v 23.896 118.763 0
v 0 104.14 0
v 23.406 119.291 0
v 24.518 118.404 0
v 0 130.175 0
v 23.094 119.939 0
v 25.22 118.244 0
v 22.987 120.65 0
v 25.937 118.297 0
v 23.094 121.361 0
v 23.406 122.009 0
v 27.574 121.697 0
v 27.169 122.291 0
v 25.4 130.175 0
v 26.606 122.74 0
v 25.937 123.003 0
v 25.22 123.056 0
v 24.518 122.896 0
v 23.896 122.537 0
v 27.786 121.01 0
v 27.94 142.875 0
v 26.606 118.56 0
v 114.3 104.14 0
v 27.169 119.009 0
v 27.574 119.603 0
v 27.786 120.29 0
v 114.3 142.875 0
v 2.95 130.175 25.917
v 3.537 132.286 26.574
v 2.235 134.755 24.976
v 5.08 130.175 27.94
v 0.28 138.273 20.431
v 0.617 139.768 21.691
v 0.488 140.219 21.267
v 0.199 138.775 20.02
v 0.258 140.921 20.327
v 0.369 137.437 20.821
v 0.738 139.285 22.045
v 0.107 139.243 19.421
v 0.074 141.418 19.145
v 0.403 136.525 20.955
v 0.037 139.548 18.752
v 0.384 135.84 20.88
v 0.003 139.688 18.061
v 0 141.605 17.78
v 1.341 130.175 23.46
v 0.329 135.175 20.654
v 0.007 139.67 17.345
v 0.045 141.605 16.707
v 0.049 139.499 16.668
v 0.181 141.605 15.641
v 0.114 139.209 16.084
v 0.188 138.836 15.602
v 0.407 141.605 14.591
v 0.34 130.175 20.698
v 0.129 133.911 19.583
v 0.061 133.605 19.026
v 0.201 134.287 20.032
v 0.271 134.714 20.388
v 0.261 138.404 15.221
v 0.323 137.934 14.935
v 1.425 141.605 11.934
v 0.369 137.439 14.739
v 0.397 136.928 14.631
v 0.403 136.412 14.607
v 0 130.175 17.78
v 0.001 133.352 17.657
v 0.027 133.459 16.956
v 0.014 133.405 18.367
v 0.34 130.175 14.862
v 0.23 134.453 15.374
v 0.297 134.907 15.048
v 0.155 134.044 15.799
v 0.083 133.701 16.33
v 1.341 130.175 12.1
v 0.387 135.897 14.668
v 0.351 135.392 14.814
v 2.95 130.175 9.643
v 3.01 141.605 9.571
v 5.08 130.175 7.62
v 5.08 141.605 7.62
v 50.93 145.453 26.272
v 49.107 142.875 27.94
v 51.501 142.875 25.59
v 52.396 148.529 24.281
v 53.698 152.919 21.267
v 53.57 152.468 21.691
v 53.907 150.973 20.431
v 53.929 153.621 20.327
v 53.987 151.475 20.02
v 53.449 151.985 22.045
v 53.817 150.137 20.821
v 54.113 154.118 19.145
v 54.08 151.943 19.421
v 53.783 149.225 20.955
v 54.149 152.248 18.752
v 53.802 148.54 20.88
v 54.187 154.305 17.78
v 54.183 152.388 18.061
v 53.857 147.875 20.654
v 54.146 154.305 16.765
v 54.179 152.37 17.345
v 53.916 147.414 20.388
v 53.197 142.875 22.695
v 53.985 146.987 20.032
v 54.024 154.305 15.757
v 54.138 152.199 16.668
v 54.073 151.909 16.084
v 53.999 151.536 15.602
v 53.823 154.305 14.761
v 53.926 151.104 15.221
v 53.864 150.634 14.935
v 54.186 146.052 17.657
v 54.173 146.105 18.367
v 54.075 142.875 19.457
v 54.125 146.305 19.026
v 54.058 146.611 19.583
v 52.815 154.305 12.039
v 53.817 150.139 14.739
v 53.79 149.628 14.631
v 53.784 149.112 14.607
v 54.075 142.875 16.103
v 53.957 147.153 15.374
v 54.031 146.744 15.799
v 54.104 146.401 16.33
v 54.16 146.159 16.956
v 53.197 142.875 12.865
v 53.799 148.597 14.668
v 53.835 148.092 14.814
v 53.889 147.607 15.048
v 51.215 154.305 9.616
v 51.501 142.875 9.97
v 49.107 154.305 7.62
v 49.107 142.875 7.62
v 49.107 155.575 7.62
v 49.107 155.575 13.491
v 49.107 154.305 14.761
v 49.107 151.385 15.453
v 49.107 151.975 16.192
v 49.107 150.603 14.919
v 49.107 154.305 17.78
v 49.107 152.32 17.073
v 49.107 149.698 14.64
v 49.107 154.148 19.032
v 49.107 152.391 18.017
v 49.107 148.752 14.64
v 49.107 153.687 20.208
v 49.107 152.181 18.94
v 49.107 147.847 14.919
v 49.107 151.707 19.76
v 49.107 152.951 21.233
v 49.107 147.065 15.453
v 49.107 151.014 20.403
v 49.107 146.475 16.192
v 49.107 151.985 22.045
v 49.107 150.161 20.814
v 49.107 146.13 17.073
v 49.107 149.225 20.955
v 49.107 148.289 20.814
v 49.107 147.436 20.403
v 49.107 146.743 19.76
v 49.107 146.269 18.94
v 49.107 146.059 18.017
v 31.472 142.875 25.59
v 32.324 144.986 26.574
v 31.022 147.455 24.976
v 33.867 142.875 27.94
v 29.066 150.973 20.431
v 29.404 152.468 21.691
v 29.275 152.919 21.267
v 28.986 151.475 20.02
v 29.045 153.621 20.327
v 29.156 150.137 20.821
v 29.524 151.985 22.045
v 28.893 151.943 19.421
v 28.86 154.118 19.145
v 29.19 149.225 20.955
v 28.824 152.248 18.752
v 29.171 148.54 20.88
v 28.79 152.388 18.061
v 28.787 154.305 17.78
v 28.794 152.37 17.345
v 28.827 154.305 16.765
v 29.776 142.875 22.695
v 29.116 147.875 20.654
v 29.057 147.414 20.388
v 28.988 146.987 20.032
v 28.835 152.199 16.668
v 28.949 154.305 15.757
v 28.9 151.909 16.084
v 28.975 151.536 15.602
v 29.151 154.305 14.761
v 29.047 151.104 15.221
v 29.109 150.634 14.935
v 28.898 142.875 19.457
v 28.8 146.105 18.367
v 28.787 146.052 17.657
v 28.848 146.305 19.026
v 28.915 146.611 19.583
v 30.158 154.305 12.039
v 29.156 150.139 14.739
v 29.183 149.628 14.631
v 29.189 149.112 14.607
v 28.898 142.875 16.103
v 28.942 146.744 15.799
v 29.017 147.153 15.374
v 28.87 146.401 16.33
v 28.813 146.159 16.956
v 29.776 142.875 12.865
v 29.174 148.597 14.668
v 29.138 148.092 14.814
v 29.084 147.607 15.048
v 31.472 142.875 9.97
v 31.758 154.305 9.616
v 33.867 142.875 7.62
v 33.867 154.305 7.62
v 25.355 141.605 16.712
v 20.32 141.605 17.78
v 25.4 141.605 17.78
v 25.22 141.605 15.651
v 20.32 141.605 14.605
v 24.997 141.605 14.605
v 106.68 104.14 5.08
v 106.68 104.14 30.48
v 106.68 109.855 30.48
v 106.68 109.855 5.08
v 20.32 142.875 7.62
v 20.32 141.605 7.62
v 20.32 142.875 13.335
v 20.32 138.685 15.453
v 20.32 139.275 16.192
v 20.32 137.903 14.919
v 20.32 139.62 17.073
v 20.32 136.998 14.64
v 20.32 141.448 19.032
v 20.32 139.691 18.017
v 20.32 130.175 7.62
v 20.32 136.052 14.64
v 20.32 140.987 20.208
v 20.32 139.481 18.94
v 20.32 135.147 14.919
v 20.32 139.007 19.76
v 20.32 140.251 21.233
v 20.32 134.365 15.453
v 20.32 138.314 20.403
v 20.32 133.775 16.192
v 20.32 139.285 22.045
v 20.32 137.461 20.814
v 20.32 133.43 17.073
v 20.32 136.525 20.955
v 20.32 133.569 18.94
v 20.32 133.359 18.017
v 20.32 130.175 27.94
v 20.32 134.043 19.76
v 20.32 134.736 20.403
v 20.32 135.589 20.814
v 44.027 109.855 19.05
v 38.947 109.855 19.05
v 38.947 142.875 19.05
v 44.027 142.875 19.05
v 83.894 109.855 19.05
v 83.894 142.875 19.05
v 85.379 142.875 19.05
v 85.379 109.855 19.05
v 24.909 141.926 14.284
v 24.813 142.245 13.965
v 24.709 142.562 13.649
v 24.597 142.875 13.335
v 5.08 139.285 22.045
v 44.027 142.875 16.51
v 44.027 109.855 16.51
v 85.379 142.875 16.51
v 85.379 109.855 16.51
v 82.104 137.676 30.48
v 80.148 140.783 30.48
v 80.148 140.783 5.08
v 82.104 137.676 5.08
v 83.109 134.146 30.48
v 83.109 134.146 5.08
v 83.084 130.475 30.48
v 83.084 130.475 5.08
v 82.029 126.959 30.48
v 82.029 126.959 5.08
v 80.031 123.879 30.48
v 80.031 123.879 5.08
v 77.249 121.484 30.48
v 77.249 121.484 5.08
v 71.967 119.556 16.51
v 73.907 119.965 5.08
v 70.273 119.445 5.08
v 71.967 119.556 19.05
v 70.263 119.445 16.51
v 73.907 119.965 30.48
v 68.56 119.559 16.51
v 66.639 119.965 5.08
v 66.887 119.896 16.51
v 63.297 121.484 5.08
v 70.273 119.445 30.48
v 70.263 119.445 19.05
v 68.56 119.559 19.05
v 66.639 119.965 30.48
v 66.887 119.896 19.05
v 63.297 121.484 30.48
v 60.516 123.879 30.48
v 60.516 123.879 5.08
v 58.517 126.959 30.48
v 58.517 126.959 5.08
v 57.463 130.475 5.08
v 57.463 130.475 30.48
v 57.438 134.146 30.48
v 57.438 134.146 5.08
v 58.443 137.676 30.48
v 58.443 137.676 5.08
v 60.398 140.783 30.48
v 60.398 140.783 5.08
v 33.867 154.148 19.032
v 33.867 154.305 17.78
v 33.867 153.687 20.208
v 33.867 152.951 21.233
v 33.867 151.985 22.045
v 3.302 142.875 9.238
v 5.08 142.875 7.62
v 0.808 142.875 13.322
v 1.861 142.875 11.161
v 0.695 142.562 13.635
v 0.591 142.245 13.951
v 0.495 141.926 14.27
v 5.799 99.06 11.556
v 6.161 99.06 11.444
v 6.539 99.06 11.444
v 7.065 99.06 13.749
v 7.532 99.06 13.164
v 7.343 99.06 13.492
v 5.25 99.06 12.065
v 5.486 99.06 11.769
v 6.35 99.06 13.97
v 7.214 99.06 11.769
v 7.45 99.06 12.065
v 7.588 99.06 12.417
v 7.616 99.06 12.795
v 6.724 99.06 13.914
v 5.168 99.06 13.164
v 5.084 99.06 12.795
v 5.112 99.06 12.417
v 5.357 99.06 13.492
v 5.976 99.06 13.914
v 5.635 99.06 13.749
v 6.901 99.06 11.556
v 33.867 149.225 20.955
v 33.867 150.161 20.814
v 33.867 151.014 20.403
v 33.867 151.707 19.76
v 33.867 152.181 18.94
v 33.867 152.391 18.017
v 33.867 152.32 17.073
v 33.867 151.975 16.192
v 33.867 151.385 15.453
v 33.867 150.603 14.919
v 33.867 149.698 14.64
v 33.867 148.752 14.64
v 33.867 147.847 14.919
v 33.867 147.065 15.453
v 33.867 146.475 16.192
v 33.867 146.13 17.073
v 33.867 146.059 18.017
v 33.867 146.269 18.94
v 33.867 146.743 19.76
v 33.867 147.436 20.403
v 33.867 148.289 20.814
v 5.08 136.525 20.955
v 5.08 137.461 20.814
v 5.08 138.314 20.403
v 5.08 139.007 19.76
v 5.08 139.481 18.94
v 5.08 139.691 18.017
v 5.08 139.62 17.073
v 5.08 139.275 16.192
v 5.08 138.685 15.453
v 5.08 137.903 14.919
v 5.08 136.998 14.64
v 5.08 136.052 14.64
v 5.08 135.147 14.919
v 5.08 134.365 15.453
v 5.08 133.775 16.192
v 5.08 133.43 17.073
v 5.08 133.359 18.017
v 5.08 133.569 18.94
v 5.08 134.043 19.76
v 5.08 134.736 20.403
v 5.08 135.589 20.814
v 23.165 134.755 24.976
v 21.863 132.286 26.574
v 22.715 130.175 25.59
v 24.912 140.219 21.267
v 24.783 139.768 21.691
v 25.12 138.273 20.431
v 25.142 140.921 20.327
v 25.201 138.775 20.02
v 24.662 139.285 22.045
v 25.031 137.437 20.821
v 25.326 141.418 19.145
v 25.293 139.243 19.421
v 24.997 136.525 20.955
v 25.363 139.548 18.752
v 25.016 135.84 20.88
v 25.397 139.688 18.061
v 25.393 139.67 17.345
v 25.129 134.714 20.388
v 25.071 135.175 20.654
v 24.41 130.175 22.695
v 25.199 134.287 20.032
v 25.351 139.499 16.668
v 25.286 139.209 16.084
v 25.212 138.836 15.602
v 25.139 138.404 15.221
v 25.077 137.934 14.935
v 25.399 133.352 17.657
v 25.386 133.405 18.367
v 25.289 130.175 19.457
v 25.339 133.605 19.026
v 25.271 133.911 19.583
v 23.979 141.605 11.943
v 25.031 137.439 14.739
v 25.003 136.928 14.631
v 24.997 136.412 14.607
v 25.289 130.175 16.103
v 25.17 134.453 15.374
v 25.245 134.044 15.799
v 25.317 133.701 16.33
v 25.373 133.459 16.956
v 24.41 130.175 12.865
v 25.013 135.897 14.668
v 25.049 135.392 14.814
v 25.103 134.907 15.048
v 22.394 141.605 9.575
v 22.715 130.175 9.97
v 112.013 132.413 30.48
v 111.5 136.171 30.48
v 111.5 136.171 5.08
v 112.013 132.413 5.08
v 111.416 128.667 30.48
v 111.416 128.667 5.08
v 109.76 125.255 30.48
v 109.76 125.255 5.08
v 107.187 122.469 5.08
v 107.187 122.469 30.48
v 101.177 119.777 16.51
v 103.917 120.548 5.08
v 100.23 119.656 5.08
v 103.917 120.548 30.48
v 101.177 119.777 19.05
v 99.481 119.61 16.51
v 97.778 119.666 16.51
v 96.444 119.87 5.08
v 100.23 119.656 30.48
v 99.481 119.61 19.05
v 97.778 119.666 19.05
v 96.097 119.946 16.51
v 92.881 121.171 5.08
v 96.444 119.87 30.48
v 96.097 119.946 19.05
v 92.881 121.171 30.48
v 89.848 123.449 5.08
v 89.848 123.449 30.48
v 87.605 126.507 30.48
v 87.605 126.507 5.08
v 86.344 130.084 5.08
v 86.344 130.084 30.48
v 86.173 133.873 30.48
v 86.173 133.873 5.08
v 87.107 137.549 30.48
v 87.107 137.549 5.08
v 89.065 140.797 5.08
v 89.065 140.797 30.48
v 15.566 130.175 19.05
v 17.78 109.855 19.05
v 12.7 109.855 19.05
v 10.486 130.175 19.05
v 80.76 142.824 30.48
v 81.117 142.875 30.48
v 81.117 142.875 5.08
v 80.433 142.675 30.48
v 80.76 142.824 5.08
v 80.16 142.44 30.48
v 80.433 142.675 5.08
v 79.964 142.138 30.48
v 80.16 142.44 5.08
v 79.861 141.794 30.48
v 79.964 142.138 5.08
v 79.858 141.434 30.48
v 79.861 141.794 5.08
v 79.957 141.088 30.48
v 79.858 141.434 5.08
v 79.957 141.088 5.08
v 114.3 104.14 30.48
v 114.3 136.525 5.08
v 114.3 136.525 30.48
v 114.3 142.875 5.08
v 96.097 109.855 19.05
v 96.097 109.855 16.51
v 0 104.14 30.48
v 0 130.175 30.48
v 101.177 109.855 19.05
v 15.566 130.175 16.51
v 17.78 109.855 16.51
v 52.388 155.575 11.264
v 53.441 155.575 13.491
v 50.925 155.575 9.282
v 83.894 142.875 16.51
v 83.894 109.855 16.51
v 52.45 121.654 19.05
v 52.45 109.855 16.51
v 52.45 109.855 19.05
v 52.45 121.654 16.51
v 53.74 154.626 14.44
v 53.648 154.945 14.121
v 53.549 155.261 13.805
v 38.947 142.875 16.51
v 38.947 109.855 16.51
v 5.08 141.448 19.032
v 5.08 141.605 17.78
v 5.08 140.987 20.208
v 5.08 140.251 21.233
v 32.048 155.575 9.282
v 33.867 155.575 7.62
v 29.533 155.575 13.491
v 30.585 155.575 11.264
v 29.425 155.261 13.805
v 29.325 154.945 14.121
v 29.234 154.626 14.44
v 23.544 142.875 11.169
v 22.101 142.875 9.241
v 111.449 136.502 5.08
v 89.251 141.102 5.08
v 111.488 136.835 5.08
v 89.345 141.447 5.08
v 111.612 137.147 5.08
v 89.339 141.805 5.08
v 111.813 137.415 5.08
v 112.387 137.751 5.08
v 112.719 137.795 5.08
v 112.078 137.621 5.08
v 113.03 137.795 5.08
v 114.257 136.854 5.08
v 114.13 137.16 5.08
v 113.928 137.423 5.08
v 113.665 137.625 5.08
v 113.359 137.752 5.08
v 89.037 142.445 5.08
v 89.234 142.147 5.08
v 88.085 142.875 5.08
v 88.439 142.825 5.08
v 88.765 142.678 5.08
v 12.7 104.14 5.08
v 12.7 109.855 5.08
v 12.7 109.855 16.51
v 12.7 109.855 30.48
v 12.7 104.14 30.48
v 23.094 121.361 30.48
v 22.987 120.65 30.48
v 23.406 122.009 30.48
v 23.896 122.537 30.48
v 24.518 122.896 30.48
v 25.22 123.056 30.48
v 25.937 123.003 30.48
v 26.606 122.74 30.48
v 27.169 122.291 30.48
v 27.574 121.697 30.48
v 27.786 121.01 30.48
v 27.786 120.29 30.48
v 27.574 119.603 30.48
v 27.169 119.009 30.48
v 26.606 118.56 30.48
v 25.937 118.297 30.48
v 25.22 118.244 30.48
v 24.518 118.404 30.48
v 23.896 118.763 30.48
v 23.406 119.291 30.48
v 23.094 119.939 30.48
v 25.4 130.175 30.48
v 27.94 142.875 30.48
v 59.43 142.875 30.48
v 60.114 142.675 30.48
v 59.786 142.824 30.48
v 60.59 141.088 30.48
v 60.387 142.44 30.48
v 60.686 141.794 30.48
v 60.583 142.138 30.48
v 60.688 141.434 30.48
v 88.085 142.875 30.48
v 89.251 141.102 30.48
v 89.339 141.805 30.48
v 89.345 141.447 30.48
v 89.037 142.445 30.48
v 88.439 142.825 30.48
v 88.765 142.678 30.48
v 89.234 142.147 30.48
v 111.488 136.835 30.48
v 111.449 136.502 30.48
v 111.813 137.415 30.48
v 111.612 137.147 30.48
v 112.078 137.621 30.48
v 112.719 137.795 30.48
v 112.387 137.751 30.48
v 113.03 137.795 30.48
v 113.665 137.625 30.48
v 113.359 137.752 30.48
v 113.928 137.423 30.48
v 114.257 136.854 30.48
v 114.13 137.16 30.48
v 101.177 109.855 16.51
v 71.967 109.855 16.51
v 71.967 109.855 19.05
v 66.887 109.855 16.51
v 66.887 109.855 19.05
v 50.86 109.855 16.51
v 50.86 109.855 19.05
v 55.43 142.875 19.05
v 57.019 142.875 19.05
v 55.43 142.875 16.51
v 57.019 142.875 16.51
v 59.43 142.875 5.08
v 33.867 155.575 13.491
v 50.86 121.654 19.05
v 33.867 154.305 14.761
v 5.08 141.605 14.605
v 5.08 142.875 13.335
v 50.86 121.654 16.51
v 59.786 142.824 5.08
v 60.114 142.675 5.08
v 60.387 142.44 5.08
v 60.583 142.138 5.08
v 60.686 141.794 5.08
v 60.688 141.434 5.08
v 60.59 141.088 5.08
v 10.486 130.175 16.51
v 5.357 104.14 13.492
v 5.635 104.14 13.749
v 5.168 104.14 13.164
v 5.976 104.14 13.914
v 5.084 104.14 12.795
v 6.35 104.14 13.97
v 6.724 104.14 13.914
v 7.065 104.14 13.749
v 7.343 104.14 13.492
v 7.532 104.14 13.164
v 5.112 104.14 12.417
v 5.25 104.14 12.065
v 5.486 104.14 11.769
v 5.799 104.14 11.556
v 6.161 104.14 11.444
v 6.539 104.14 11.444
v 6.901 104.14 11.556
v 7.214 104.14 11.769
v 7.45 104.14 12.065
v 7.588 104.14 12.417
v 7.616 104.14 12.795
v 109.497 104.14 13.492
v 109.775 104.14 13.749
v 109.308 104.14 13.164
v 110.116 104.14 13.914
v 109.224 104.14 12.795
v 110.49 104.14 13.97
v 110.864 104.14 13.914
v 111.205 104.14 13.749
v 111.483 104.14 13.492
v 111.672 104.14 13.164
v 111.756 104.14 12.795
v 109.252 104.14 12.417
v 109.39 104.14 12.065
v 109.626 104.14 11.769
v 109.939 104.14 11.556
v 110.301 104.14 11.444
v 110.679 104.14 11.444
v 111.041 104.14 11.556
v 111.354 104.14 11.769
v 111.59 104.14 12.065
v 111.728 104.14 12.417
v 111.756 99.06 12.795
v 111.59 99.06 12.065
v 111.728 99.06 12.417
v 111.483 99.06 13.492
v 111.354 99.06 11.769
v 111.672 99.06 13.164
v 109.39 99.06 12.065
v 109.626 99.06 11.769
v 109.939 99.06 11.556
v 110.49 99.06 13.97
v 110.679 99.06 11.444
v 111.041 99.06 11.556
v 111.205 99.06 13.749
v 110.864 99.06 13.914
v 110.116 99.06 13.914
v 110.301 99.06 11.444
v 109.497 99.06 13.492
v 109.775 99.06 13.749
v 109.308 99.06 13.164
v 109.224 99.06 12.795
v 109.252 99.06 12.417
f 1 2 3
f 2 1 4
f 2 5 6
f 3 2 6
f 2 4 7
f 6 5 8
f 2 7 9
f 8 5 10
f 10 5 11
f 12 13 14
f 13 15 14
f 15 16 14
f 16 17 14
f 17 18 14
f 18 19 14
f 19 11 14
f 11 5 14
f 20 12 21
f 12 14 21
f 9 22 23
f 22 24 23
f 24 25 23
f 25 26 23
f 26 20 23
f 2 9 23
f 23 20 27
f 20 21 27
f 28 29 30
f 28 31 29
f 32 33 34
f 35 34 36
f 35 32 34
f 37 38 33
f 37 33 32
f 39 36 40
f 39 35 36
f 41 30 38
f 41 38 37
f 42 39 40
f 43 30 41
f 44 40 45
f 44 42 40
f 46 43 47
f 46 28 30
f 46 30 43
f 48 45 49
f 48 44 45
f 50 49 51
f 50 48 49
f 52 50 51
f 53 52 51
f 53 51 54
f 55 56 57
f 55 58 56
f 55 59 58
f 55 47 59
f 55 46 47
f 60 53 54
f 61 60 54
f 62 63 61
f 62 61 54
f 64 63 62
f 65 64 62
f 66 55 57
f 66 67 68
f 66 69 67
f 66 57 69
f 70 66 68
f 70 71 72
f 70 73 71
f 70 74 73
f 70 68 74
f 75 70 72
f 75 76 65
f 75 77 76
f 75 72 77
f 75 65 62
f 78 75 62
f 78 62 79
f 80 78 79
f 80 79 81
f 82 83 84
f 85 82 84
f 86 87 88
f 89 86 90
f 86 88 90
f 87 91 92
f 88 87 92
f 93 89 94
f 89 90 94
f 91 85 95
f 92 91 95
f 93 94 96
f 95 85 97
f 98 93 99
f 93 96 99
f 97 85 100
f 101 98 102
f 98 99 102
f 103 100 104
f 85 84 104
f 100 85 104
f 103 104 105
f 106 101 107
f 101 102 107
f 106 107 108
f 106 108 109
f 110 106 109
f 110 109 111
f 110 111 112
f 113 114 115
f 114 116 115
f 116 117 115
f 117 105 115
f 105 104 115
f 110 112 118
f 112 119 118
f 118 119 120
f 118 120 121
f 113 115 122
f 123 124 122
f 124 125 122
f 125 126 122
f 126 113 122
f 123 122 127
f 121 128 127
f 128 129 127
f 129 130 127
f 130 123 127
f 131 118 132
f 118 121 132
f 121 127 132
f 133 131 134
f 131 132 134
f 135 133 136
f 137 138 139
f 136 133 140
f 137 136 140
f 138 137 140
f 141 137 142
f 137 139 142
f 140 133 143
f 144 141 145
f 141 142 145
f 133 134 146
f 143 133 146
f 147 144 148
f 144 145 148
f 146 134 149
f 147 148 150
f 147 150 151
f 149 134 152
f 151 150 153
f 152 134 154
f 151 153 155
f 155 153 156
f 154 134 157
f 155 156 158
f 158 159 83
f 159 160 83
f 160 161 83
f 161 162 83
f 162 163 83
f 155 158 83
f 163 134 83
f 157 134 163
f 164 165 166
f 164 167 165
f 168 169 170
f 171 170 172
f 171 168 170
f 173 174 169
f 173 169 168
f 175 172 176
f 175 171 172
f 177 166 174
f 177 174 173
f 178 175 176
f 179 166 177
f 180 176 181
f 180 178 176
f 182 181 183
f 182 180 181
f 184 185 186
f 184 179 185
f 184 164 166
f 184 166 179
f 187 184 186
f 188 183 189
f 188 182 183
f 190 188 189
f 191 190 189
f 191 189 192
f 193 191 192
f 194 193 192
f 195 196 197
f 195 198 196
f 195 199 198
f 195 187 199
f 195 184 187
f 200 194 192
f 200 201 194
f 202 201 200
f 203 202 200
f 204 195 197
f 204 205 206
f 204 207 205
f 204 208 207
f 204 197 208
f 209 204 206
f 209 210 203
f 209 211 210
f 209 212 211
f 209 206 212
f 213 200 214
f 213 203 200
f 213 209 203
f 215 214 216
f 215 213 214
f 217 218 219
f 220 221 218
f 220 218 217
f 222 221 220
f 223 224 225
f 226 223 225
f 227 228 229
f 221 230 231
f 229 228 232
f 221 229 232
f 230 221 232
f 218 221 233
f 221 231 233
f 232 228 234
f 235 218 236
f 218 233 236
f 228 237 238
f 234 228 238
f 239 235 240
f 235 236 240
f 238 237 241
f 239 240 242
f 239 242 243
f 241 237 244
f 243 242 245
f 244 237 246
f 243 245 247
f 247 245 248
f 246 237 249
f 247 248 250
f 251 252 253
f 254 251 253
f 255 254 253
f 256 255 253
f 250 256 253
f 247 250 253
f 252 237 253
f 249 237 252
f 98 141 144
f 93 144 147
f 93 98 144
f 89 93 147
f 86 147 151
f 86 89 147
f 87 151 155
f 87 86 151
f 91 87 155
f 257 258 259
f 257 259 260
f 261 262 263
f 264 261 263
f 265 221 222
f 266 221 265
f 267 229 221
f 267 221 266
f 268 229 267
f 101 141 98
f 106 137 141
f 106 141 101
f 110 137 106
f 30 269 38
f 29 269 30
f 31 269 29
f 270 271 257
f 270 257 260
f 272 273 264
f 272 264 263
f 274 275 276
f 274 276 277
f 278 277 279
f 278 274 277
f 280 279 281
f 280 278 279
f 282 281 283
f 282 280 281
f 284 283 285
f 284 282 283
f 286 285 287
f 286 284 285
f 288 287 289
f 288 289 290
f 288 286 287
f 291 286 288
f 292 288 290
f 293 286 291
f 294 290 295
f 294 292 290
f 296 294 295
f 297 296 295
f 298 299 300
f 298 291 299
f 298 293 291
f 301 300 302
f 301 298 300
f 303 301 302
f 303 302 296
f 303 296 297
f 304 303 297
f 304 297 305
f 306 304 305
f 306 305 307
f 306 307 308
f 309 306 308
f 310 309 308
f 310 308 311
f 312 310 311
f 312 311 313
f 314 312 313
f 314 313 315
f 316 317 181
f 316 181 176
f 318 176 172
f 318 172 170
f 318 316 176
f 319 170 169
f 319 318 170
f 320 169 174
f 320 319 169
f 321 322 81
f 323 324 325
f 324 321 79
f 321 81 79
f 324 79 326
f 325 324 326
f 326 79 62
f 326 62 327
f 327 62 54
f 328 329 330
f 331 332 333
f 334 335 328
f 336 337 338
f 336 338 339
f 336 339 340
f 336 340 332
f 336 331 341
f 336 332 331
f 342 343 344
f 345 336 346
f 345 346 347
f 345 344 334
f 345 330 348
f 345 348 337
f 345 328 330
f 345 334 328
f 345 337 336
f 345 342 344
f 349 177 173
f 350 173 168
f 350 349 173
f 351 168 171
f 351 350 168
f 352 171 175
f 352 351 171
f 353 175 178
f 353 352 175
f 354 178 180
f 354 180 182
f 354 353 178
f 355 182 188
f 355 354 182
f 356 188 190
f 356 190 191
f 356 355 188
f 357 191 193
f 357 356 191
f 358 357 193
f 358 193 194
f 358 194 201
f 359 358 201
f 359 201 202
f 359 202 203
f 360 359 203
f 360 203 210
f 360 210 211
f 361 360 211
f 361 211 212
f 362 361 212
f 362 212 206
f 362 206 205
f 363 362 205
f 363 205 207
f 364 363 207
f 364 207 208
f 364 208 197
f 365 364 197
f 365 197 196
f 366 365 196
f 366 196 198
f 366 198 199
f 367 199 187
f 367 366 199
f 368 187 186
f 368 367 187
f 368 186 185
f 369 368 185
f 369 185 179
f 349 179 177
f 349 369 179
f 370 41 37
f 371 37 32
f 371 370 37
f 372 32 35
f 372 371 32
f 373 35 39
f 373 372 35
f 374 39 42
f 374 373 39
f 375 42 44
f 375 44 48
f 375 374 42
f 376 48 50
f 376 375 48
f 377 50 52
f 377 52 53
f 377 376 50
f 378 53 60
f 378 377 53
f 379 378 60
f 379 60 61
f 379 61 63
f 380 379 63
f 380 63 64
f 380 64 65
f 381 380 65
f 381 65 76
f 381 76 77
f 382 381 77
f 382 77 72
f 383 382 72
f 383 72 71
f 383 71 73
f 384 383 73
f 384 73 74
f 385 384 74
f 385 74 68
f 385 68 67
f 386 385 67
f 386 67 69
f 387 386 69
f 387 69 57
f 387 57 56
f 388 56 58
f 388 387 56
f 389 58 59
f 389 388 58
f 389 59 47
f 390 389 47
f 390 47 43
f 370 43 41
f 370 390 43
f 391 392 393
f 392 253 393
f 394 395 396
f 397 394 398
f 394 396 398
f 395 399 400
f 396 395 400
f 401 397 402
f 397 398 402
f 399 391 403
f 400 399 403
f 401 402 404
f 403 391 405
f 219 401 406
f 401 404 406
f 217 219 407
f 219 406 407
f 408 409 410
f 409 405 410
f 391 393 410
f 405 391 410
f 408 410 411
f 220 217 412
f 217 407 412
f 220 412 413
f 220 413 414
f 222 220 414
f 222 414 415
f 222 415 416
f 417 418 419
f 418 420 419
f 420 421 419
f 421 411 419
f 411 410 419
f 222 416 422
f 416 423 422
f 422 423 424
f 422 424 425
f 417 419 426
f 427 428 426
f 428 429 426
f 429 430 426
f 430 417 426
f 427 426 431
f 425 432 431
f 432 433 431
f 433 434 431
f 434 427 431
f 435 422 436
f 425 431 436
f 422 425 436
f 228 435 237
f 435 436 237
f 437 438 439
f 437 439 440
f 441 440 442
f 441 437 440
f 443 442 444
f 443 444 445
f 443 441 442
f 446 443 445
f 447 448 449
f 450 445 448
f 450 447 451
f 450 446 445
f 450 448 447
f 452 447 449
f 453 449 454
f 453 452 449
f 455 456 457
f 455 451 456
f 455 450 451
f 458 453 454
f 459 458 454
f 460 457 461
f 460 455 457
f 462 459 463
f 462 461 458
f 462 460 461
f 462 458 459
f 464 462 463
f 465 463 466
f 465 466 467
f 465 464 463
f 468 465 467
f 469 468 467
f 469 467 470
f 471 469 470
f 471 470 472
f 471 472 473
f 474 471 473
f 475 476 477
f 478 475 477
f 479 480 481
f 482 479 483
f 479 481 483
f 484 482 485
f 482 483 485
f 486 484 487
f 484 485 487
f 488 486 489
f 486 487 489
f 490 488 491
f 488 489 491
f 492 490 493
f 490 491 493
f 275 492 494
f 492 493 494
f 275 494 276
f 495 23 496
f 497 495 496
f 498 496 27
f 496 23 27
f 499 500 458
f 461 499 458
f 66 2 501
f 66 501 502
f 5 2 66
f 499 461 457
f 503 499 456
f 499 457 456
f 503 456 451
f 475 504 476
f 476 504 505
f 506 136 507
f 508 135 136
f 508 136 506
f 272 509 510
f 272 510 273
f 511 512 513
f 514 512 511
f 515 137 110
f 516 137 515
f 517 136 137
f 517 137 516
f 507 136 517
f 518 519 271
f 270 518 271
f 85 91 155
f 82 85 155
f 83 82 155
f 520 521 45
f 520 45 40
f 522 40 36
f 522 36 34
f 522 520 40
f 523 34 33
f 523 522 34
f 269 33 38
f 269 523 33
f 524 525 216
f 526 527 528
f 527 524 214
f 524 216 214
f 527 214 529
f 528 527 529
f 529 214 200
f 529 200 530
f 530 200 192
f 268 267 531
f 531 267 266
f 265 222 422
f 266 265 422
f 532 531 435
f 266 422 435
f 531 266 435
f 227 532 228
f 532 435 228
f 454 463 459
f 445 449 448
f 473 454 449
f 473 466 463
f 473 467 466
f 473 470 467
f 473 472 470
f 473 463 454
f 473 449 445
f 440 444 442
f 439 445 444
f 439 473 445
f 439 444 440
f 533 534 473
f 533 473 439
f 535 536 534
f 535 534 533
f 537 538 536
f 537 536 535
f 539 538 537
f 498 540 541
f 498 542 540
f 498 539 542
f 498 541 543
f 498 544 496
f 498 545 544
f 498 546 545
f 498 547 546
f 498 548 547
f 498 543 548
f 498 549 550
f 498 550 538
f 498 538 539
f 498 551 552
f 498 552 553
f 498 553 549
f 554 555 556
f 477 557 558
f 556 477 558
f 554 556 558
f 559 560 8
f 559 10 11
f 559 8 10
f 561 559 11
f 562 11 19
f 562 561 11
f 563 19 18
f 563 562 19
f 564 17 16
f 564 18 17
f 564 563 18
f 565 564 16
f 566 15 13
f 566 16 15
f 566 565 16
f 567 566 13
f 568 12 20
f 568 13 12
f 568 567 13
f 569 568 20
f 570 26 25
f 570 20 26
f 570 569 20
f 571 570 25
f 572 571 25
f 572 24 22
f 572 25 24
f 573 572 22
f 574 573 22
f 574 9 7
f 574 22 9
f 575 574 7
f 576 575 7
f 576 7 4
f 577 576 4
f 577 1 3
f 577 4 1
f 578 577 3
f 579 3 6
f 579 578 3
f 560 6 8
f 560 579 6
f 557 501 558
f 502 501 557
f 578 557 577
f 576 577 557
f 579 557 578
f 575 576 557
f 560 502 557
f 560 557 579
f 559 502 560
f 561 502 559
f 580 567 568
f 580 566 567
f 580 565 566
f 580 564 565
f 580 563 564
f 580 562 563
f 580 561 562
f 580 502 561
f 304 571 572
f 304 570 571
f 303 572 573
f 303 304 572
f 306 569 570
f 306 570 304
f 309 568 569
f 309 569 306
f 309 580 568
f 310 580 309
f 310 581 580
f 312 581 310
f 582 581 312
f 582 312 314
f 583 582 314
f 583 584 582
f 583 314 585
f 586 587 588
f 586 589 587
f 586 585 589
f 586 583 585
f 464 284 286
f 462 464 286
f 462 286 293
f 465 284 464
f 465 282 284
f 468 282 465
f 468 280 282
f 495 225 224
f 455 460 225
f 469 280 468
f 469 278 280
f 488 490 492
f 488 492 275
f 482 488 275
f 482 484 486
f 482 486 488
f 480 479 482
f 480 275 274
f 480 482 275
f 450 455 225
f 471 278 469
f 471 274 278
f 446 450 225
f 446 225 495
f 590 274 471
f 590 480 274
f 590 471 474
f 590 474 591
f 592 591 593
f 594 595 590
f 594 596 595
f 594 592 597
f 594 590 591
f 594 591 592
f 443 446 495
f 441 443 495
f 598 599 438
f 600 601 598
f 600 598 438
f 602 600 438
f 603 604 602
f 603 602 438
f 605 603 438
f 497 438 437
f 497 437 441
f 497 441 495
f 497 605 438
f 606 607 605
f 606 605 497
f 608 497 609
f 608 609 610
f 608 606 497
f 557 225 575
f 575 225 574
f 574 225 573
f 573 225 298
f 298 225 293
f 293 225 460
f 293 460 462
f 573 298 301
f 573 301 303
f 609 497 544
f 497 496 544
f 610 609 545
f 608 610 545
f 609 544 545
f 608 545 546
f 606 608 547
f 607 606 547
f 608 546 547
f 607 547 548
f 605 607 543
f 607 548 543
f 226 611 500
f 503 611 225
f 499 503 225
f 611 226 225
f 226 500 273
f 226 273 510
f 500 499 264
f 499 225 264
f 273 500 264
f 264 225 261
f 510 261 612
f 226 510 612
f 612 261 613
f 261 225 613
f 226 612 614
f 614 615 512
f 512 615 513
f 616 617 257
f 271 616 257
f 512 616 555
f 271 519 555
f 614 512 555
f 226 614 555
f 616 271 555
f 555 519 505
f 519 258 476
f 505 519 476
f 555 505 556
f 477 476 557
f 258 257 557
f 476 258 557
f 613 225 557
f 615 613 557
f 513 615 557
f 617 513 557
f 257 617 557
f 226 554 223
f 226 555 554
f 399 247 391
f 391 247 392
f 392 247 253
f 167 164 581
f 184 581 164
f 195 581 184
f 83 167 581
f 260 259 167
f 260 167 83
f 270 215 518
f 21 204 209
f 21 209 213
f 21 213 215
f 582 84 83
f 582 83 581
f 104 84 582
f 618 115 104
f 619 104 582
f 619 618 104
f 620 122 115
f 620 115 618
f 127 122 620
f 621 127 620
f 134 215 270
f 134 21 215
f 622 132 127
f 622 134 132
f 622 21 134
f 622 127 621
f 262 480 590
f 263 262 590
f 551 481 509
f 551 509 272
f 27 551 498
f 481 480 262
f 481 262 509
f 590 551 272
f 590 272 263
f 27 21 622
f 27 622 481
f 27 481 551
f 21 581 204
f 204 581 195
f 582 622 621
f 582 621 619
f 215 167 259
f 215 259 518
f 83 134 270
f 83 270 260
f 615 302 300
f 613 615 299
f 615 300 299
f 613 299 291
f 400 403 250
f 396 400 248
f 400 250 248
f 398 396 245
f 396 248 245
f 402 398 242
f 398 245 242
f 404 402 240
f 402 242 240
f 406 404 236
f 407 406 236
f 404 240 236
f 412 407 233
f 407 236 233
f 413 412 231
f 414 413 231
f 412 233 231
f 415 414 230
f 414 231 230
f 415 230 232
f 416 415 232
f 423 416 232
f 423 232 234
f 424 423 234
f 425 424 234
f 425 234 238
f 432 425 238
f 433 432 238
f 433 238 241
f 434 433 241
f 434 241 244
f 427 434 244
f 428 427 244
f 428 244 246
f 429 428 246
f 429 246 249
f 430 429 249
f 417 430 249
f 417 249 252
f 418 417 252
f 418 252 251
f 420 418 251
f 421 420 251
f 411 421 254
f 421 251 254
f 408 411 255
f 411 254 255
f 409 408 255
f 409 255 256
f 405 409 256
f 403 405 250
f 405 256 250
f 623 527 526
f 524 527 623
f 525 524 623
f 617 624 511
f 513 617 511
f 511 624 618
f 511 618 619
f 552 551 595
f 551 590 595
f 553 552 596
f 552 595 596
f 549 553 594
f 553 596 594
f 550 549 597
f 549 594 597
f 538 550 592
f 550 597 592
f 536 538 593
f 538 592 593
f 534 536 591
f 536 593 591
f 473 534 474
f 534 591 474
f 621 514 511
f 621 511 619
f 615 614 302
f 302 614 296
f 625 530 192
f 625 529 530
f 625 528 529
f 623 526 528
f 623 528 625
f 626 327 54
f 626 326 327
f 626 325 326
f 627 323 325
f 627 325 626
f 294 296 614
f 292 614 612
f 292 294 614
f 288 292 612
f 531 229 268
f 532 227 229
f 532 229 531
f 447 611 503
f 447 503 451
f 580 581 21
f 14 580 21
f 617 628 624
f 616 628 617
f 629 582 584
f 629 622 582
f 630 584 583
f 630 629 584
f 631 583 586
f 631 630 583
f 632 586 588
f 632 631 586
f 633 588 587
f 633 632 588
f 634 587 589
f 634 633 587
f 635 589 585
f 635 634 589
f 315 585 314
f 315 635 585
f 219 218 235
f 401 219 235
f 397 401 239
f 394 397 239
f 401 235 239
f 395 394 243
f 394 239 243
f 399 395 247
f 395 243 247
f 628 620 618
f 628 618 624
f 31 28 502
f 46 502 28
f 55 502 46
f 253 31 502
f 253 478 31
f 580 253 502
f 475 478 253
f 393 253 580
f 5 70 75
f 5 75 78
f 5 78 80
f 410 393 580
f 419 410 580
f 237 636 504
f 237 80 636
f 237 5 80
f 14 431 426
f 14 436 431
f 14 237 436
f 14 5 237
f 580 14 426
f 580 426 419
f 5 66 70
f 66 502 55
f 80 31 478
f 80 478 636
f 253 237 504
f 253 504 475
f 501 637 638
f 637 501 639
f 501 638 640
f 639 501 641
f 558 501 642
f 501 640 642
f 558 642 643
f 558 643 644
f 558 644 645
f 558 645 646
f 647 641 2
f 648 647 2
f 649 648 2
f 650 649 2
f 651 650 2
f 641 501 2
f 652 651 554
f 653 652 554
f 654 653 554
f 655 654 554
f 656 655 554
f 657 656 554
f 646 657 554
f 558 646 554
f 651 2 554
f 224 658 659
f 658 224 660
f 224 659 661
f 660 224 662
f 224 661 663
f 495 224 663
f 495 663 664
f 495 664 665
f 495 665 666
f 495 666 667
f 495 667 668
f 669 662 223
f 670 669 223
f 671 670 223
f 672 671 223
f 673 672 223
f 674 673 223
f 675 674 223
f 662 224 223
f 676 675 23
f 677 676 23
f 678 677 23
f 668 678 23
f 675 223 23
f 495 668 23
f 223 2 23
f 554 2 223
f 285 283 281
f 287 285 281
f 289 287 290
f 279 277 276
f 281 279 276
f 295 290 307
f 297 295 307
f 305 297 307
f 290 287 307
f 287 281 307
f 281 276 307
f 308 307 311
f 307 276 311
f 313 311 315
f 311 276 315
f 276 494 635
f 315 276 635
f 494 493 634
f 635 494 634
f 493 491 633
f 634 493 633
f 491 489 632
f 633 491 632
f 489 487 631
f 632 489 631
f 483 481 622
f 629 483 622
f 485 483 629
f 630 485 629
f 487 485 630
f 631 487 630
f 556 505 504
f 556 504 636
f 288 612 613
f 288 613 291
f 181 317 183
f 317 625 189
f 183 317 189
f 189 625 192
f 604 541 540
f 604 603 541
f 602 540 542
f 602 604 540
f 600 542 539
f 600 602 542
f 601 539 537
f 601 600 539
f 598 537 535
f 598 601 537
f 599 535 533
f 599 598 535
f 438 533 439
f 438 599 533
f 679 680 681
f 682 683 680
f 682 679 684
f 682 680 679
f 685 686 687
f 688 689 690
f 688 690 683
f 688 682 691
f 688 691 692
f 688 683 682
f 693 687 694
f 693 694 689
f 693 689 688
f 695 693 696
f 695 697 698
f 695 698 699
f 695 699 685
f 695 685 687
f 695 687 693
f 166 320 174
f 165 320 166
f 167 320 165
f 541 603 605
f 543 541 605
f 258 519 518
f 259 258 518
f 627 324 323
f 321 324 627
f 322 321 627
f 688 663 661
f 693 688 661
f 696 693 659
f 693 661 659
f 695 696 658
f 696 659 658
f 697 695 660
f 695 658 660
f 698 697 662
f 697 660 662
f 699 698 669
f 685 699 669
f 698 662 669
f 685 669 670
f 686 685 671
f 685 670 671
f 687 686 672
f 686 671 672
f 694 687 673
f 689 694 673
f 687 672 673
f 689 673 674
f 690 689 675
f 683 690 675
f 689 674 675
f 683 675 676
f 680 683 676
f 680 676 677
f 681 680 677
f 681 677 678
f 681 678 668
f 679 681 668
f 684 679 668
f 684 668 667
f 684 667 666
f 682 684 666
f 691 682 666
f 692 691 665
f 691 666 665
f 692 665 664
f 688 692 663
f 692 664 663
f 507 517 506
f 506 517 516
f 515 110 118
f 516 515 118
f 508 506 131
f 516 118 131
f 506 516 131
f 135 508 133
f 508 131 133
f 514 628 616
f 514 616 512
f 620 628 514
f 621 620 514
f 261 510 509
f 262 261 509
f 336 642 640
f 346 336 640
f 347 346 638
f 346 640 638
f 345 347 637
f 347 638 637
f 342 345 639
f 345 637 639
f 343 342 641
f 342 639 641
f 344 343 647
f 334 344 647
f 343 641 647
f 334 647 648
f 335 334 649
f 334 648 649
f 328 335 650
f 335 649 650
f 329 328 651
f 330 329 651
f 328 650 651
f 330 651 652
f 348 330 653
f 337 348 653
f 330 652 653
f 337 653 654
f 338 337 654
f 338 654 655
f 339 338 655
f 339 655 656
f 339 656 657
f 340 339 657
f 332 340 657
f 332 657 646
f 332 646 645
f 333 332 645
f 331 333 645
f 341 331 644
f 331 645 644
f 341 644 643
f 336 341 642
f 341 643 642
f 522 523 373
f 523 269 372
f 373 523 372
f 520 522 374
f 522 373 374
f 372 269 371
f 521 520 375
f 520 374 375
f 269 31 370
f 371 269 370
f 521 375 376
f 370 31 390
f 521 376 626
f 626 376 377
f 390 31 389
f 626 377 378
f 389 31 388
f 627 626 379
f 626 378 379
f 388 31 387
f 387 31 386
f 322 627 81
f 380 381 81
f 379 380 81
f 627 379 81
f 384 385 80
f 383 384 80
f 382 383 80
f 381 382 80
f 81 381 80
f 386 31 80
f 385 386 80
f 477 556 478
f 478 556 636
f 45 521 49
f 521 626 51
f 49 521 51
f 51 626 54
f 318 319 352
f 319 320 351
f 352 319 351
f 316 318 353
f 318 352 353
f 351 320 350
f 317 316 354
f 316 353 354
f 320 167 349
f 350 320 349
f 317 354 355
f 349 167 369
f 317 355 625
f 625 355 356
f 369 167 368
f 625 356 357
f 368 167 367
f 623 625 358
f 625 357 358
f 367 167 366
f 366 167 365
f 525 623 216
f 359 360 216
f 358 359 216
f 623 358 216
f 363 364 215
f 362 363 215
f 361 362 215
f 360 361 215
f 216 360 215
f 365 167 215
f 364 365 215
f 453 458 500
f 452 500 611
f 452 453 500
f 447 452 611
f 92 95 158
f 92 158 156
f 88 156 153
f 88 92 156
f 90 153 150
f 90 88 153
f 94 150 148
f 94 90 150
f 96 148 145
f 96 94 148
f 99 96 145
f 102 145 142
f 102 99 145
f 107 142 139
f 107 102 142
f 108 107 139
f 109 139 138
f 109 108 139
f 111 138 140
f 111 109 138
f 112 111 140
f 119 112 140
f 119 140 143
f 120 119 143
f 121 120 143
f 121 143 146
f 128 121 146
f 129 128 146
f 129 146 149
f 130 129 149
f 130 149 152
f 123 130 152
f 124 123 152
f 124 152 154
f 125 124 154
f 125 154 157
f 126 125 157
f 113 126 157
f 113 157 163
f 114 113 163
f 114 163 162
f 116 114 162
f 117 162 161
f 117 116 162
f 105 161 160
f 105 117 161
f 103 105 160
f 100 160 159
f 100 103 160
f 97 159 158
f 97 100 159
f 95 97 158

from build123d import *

# Parameters (mm, degrees)
SKETCH2_W                      = 114.3
SKETCH2_H                      = 142.875
BOSS_EXTRUDE2_DEPTH            = 30.48
FILLET1_SIZE                   = 25.4
FILLET1_SIZE_2                 = 71.501
BOSS_EXTRUDE3_DEPTH            = 11.43
CUT_EXTRUDE2_DEPTH             = 25.4
FILLET2_R                      = 1.27
SKETCH7_W                      = 27.94
SKETCH7_H                      = 30.48
CUT_EXTRUDE4_DEPTH             = 12.7
BOSS_EXTRUDE4_DEPTH            = 11.43
CUT_EXTRUDE6_DEPTH             = 25.4
CUT_EXTRUDE7_DEPTH             = 171.262283535
CUT_EXTRUDE7_DEPTH_BACK        = 171.262283535
SKETCH11_R                     = 3.175
CUT_EXTRUDE8_REACH             = 185.225
SKETCH12_R                     = 3.175
CUT_EXTRUDE8_DIRECTION_2_DEPTH = 184.224735996
CHAMFER1_SIZE2                 = 12.7
CHAMFER1_SIZE                  = 2.54
SKETCH13_W                     = 7.62
SKETCH13_H                     = 5.08
CUT_EXTRUDE9_DEPTH             = 25.4
FILLET4_R                      = 1.27
CUT_EXTRUDE10_DEPTH            = 195.431359314
CHAMFER2_SIZE                  = 12.7
CUT_EXTRUDE11_REACH            = 196.431
SKETCH15_R                     = 3.175
BOSS_EXTRUDE5_DEPTH            = 1.27
CHAMFER3_SIZE                  = 1.27
BOSS_EXTRUDE6_DEPTH            = 1.27
CHAMFER4_SIZE                  = 1.27
FILLET5_R                      = 15.24
CUT_EXTRUDE12_DEPTH            = 16.51
SKETCH20_W                     = 2.54
SKETCH20_H                     = 2.54
CUT_EXTRUDE13_DEPTH            = 171.777226453
FILLET6_R                      = 1.27
CUT_EXTRUDE14_DEPTH            = 1.27
CUT_EXTRUDE14_DEPTH_BACK       = 1.27
SKETCH21_W                     = 5.08
SKETCH21_H                     = 33.02
SKETCH21_H_2                   = 10.040791179
SKETCH21_H_3                   = 10.09120709
SKETCH21_W_2                   = 7.62
SKETCH21_H_4                   = 1.402013576
SKETCH21_W_3                   = 1.485233779
FILLET7_R                      = 11.43
SKETCH22_R                     = 1.27
CUT_EXTRUDE15_DEPTH            = 12.7
CUT_EXTRUDE16_DEPTH            = 196.440786647
CUT_EXTRUDE16_DEPTH_BACK       = 196.440786647
SKETCH23_R                     = 2.413
SKETCH24_W                     = 12.7
SKETCH24_H                     = 30.48
BOSS_EXTRUDE7_DEPTH            = 25.4
SKETCH25_R                     = 2.54
CUT_EXTRUDE17_DEPTH            = 178.14615249
CUT_EXTRUDE18_DEPTH            = 104.14
CUT_EXTRUDE18_DEPTH_BACK       = 43.18
SKETCH27_W                     = 143.457929344
SKETCH27_H                     = 100.176079989
SKETCH28_R                     = 1.27
BOSS_EXTRUDE8_DEPTH            = 5.08


# Some blends are built 0.0001 mm under size
with BuildPart() as part:
    # Sketch2 → Boss-Extrude2 (new body)
    with BuildSketch(Plane.XY):
        with Locations((57.15, 71.4375)):
            Rectangle(SKETCH2_W, SKETCH2_H)
    extrude(amount=BOSS_EXTRUDE2_DEPTH)

    # Fillet1
    # an asymmetric fillet: 71.501, 25.4 mm, written as the material it takes off along each edge
    with BuildSketch(Plane(origin=(0, 0, -178.7525), x_dir=(1, 0, 0), z_dir=(0, 0, 1))) as fillet1_piece_1:
        with BuildLine():
            Bezier((FILLET1_SIZE, 0), (0, 0), (0, FILLET1_SIZE_2), weights=[1, 0.707106781, 1])
            Line((0, FILLET1_SIZE_2), (0, 0))
            Line((0, 0), (FILLET1_SIZE, 0))
        make_face()
    extrude(amount=387.985, mode=Mode.SUBTRACT)

    # Sketch3 → Boss-Extrude3 (add)
    with BuildSketch(Plane(origin=(0, 142.875, 0), x_dir=(1, 0, 0), z_dir=(0, 1, 0))):
        with BuildLine():
            Line((33.866582, -7.62), (33.866582, -27.94))
            ThreePointArc((33.866582, -27.94), (28.786582, -17.78), (33.866582, -7.62))
        make_face()
        with BuildLine():
            Line((49.106582, -7.62), (49.106582, -27.94))
            ThreePointArc((49.106582, -27.94), (54.186582, -17.78), (49.106582, -7.62))
        make_face()
    extrude(amount=BOSS_EXTRUDE3_DEPTH)

    # Sketch5 → Cut-Extrude2 (cut)
    with BuildSketch(Plane.XY.offset(30.48)):
        with BuildLine():
            Line((62.653333333, 142.875), (77.893333333, 142.875))
            ThreePointArc((77.893333333, 142.875), (70.273333333, 119.445231961), (62.653333333, 142.875))
        make_face()
        with BuildLine():
            Line((91.44, 143.032457663), (106.68, 143.032457663))
            ThreePointArc((106.68, 143.032457663), (99.06, 119.602689625), (91.44, 143.032457663))
        make_face()
    extrude(amount=-CUT_EXTRUDE2_DEPTH, mode=Mode.SUBTRACT)

    # Fillet2
    fillet2_edges = [part.edges().sort_by_distance(p)[0] for p in [
        (77.893333333, 142.875, 17.78),
        (62.653333333, 142.875, 17.78),
        (91.228104508, 142.875, 17.78),
    ]]
    fillet(fillet2_edges, radius=FILLET2_R)

    # Sketch7 → Cut-Extrude4 (cut)
    with BuildSketch(Plane(origin=(0, 142.875, 0), x_dir=(1, 0, 0), z_dir=(0, 1, 0))):
        with Locations((13.97, -15.24)):
            Rectangle(SKETCH7_W, SKETCH7_H)
    extrude(amount=-CUT_EXTRUDE4_DEPTH, mode=Mode.SUBTRACT)

    # Sketch8 → Boss-Extrude4 (add)
    with BuildSketch(Plane(origin=(0, 130.175, 0), x_dir=(1, 0, 0), z_dir=(0, 1, 0))):
        with BuildLine():
            Line((5.08, -7.62), (5.08, -27.94))
            ThreePointArc((5.08, -27.94), (0, -17.78), (5.08, -7.62))
        make_face()
        with BuildLine():
            Line((20.32, -7.62), (20.32, -27.94))
            ThreePointArc((20.32, -27.94), (25.4, -17.78), (20.32, -7.62))
        make_face()
    extrude(amount=BOSS_EXTRUDE4_DEPTH)

    # Sketch10 → Cut-Extrude6 (cut)
    with BuildSketch(Plane.XY.offset(30.48)):
        Polygon((63.5, 109.855), (12.7, 109.855), (12.7, 61.2775), (38.1, 12.7), (63.5, 12.7), (63.5, 94.615), (106.68, 94.615), (106.68, 109.855), align=None)
    extrude(amount=-CUT_EXTRUDE6_DEPTH, mode=Mode.SUBTRACT)

    # Sketch11 → Cut-Extrude7 (cut, two sides: drawn at the far end of the back side and taken through both)
    with BuildSketch(Plane.ZY.offset(-49.106582).offset(-CUT_EXTRUDE7_DEPTH_BACK)):
        with Locations((17.78, 149.225)):
            Circle(SKETCH11_R)
        with BuildLine():
            Line((22.044917923, 151.984868677), (27.94, 142.875))
            Line((27.94, 142.875), (27.94, 154.305))
            Line((27.94, 154.305), (17.78, 154.305))
            ThreePointArc((17.78, 154.305), (20.207577715, 153.687428312), (22.044917923, 151.984868677))
        make_face()
    extrude(amount=CUT_EXTRUDE7_DEPTH + CUT_EXTRUDE7_DEPTH_BACK, mode=Mode.SUBTRACT)

    # Cut-Extrude8: up to this face of the body (flat: up to its plane)
    cut_extrude8_end = Plane(part.part.faces().sort_by_distance((27.94, 136.525, 15.24))[0])
    # Sketch12 → Cut-Extrude8 (cut, up to the picked face)
    with BuildSketch(Plane.ZY.offset(-20.32), mode=Mode.PRIVATE) as cut_extrude8_sk1:
        with Locations((17.78, 136.525)):
            Circle(SKETCH12_R)
    cut_extrude8_tool1 = split(extrude(cut_extrude8_sk1.sketch, amount=-CUT_EXTRUDE8_REACH, mode=Mode.PRIVATE), bisect_by=cut_extrude8_end, keep=Keep.BOTH, mode=Mode.PRIVATE)
    # Sketch12 → Cut-Extrude8 (cut, up to the picked face)
    with BuildSketch(Plane.ZY.offset(-20.32), mode=Mode.PRIVATE) as cut_extrude8_sk2:
        with BuildLine():
            Line((22.044917923, 139.284868677), (27.94, 130.175))
            Line((27.94, 130.175), (27.94, 141.605))
            Line((27.94, 141.605), (17.78, 141.605))
            ThreePointArc((17.78, 141.605), (20.207577715, 140.987428312), (22.044917923, 139.284868677))
        make_face()
    cut_extrude8_tool2 = split(extrude(cut_extrude8_sk2.sketch, amount=-CUT_EXTRUDE8_REACH, mode=Mode.PRIVATE), bisect_by=cut_extrude8_end, keep=Keep.BOTH, mode=Mode.PRIVATE)
    add(cut_extrude8_tool1.solids().sort_by(Axis((20.32, 136.525, 17.78), (1, 0, 0)))[0], mode=Mode.SUBTRACT)
    add(cut_extrude8_tool2.solids().sort_by(Axis((20.32, 137.885407, 25.333291), (1, 0, 0)))[0], mode=Mode.SUBTRACT)

    # Sketch12 → Cut-Extrude8 direction 2 (cut)
    with BuildSketch(Plane.ZY.offset(-20.32)):
        with Locations((17.78, 136.525)):
            Circle(SKETCH12_R)
        with BuildLine():
            Line((22.044917923, 139.284868677), (27.94, 130.175))
            Line((27.94, 130.175), (27.94, 141.605))
            Line((27.94, 141.605), (17.78, 141.605))
            ThreePointArc((17.78, 141.605), (20.207577715, 140.987428312), (22.044917923, 139.284868677))
        make_face()
    extrude(amount=CUT_EXTRUDE8_DIRECTION_2_DEPTH, mode=Mode.SUBTRACT)

    # Chamfer1
    chamfer1_edges = [part.edges().sort_by_distance(p)[0] for p in [
        (27.94, 130.175, 15.24),
    ]]
    chamfer1_side = [part.faces().sort_by_distance(p)[0] for p in [
        (27.8892, 130.175, 15.24),
    ]]
    chamfer(chamfer1_edges, length=CHAMFER1_SIZE - 0.0001, length2=CHAMFER1_SIZE2 - 0.0001, reference=chamfer1_side[0])  # a hair under: the kernel refuses the full size

    # Sketch13 → Cut-Extrude9 (cut)
    with BuildSketch(Plane.XY.offset(30.48)):
        with Locations((110.49, 140.335)):
            Rectangle(SKETCH13_W, SKETCH13_H)
    extrude(amount=-CUT_EXTRUDE9_DEPTH, mode=Mode.SUBTRACT)

    # Fillet4
    fillet4_edges = [part.edges().sort_by_distance(p)[0] for p in [
        (110.907625096, 137.795, 17.78),
        (114.3, 137.795, 17.78),
    ]]
    fillet(fillet4_edges, radius=FILLET4_R)

    # Sketch14 → Cut-Extrude10 (cut, through all)
    with BuildSketch(Plane.XY.offset(30.48)):
        Polygon((114.3, 12.7), (81.28, 12.7), (81.28, 26.67), (111.76, 26.67), (111.76, 69.85), (81.28, 69.85), (81.28, 83.82), (114.3, 83.82), align=None)
    extrude(amount=-CUT_EXTRUDE10_DEPTH, mode=Mode.SUBTRACT)

    # Chamfer2
    chamfer2_edges = [part.edges().sort_by_distance(p)[0] for p in [
        (81.28, 76.835, 30.48),
        (81.28, 19.685, 30.48),
    ]]
    chamfer(chamfer2_edges, length=CHAMFER2_SIZE)

    # Cut-Extrude11: up to this face of the body (flat: up to its plane)
    cut_extrude11_end = Plane(part.part.faces().sort_by_distance((59.69, 109.855, 17.78))[0])
    # Sketch15 → Cut-Extrude11 (cut, up to the picked face)
    with BuildSketch(Plane.XZ, mode=Mode.PRIVATE) as cut_extrude11_sk1:
        with Locations(Location((99.06, 17.78, 0), (0, 0, 270))):
            Circle(SKETCH15_R)
    cut_extrude11_tool1 = split(extrude(cut_extrude11_sk1.sketch, amount=-CUT_EXTRUDE11_REACH, mode=Mode.PRIVATE), bisect_by=cut_extrude11_end, keep=Keep.BOTH, mode=Mode.PRIVATE)
    add(cut_extrude11_tool1.solids().sort_by(Axis((99.06, 0, 17.78), (0, 1, 0)))[0], mode=Mode.SUBTRACT)

    # Sketch16 → Boss-Extrude5 (add)
    with BuildSketch(Plane(origin=(0, 141.605, 0), x_dir=(1, 0, 0), z_dir=(0, 1, 0))):
        with BuildLine():
            Line((0.406992957, -14.590646171), (5.08, -14.605))
            Line((5.08, -14.605), (5.08, -7.62))
            ThreePointArc((5.08, -7.62), (2.151092977, -10.708185479), (0.406992957, -14.590646171))
        make_face()
        with BuildLine():
            Line((20.32, -14.605), (24.996722124, -14.605))
            ThreePointArc((24.996722124, -14.605), (23.253033275, -10.714344425), (20.32, -7.62))
            Line((20.32, -7.62), (20.32, -14.605))
        make_face()
    extrude(amount=BOSS_EXTRUDE5_DEPTH)

    # Chamfer3
    chamfer3_edges = [part.edges().sort_by_distance(p)[0] for p in [
        (22.658361062, 142.875, 14.605),
        (2.743496479, 142.875, 14.597823086),
    ]]
    chamfer(chamfer3_edges, length=CHAMFER3_SIZE - 0.0001)  # a hair under: the kernel refuses the full size

    # Sketch17 → Boss-Extrude6 (add)
    with BuildSketch(Plane(origin=(0, 154.305, 0), x_dir=(1, 0, 0), z_dir=(0, 1, 0))):
        with BuildLine():
            Line((29.150536334, -14.761394806), (33.866582, -14.761394806))
            Line((33.866582, -14.761394806), (33.866582, -7.62))
            ThreePointArc((33.866582, -7.62), (30.888902084, -10.781487273), (29.150536334, -14.761394806))
        make_face()
        with BuildLine():
            Line((49.106582, -14.761394806), (53.822627666, -14.761394806))
            ThreePointArc((53.822627666, -14.761394806), (52.084261916, -10.781487273), (49.106582, -7.62))
            Line((49.106582, -7.62), (49.106582, -14.761394806))
        make_face()
    extrude(amount=BOSS_EXTRUDE6_DEPTH)

    # Chamfer4
    chamfer4_edges = [part.edges().sort_by_distance(p)[0] for p in [
        (51.464604833, 155.575, 14.761394806),
        (31.508559167, 155.575, 14.761394806),
    ]]
    chamfer(chamfer4_edges, length=CHAMFER4_SIZE - 0.0001)  # a hair under: the kernel refuses the full size

    # Fillet5
    fillet5_edges = [part.edges().sort_by_distance(p)[0] for p in [
        (111.76, 48.26, 30.48),
    ]]
    fillet(fillet5_edges, radius=FILLET5_R)

    # Sketch19 → Cut-Extrude12 (cut)
    with BuildSketch(Plane.XY.offset(30.48)):
        Polygon((81.28, 52.07), (111.76, 52.07), (111.76, 57.15), (81.28, 57.15), (69.85, 57.15), (69.85, 52.07), align=None)
    extrude(amount=-CUT_EXTRUDE12_DEPTH, mode=Mode.SUBTRACT)

    # Sketch20 → Cut-Extrude13 (cut, through all)
    with BuildSketch(Plane.ZY.offset(-63.5)):
        with Locations((19.05, 39.37)):
            Rectangle(SKETCH20_W, SKETCH20_H)
    extrude(amount=-CUT_EXTRUDE13_DEPTH, mode=Mode.SUBTRACT)

    # Fillet6
    fillet6_edges = [part.edges().sort_by_distance(p)[0] for p in [
        (63.5, 38.1, 19.05),
    ]]
    fillet(fillet6_edges, radius=FILLET6_R)

    # Sketch21 → Cut-Extrude14 (cut, two sides: drawn at the far end of the back side and taken through both)
    with BuildSketch(Plane.XY.offset(17.78).offset(-CUT_EXTRUDE14_DEPTH_BACK)):
        Polygon((12.7, 109.855), (10.485930724, 130.175), (15.565930724, 130.175), (17.78, 109.855), align=None)
        Polygon((55.429725371, 142.875), (50.86041281, 121.653709764), (50.86041281, 109.855), (52.449738918, 109.855), (52.449738918, 121.653709764), (57.019051479, 142.875), align=None)
        with Locations((41.486582, 126.365)):
            Rectangle(SKETCH21_W, SKETCH21_H)
        with Locations((69.426582, 114.87539559)):
            Rectangle(SKETCH21_W, SKETCH21_H_2)
        with Locations((98.636582, 114.900603545)):
            Rectangle(SKETCH21_W, SKETCH21_H_3)
        with Locations((110.49, 102.445426643)):
            Rectangle(SKETCH21_W_2, SKETCH21_H_4)
        with Locations((84.636338767, 126.365)):
            Rectangle(SKETCH21_W_3, SKETCH21_H)
    extrude(amount=CUT_EXTRUDE14_DEPTH + CUT_EXTRUDE14_DEPTH_BACK, mode=Mode.SUBTRACT)

    # Fillet7
    fillet7_edges = [part.edges().sort_by_distance(p)[0] for p in [
        (63.5, 94.615, 17.78),
    ]]
    fillet(fillet7_edges, radius=FILLET7_R)

    # Sketch22 → Cut-Extrude15 (cut)
    with BuildSketch(Plane(origin=(0, 12.7, 0), x_dir=(1, 0, 0), z_dir=(0, 1, 0))):
        with Locations(Location((43.18, -11.908276952, 0), (0, 0, 180))):
            Circle(SKETCH22_R)
        with Locations(Location((48.26, -11.908276952, 0), (0, 0, 180))):
            Circle(SKETCH22_R)
        with Locations(Location((53.34, -11.908276952, 0), (0, 0, 180))):
            Circle(SKETCH22_R)
        with Locations(Location((58.42, -11.908276952, 0), (0, 0, 180))):
            Circle(SKETCH22_R)
        with Locations(Location((43.18, -22.068276952, 0), (0, 0, 180))):
            Circle(SKETCH22_R)
        with Locations(Location((48.26, -22.068276952, 0), (0, 0, 180))):
            Circle(SKETCH22_R)
        with Locations(Location((53.34, -22.068276952, 0), (0, 0, 180))):
            Circle(SKETCH22_R)
        with Locations(Location((58.42, -22.068276952, 0), (0, 0, 180))):
            Circle(SKETCH22_R)
    extrude(amount=-CUT_EXTRUDE15_DEPTH, mode=Mode.SUBTRACT)

    # Sketch23 → Cut-Extrude16 (cut, two sides: drawn at the far end of the back side and taken through both)
    with BuildSketch(Plane(origin=(0, 0, 0), x_dir=(-1, 0, 0), z_dir=(0, 0, -1)).offset(-CUT_EXTRUDE16_DEPTH_BACK)):
        with Locations((-25.4, 120.65)):
            Circle(SKETCH23_R)
        with Locations((-19.05, 25.4)):
            Circle(SKETCH23_R)
        with Locations((-82.55, 6.35)):
            Circle(SKETCH23_R)
    extrude(amount=CUT_EXTRUDE16_DEPTH + CUT_EXTRUDE16_DEPTH_BACK, mode=Mode.SUBTRACT)

    # Sketch24 → Boss-Extrude7 (add)
    with BuildSketch(Plane.XZ):
        with Locations((31.75, 15.24)):
            Rectangle(SKETCH24_W, SKETCH24_H)
        with Locations((72.695229231, 15.24)):
            Rectangle(SKETCH24_W, SKETCH24_H)
    extrude(amount=BOSS_EXTRUDE7_DEPTH)

    # Sketch25 → Cut-Extrude17 (cut, through all)
    with BuildSketch(Plane(origin=(79.045229231, 0, 0), x_dir=(0, 0, -1), z_dir=(1, 0, 0))):
        with Locations((-15.24, -12.7)):
            Circle(SKETCH25_R)
    extrude(amount=-CUT_EXTRUDE17_DEPTH, mode=Mode.SUBTRACT)

    # Sketch27 → Cut-Extrude18 (cut, two sides: drawn at the far end of the back side and taken through both)
    with BuildSketch(Plane(origin=(0, 0, 0), x_dir=(1, 0, 0), z_dir=(0, 1, 0)).offset(-CUT_EXTRUDE18_DEPTH_BACK)):
        with Locations((68.63275208, 14.348076665)):
            Rectangle(SKETCH27_W, SKETCH27_H)
    extrude(amount=CUT_EXTRUDE18_DEPTH + CUT_EXTRUDE18_DEPTH_BACK, mode=Mode.SUBTRACT)

    # Sketch28 → Boss-Extrude8 (add)
    with BuildSketch(Plane.XZ.offset(-104.14)):
        with Locations(Location((6.35, 12.7, 0), (0, 0, 90))):
            Circle(SKETCH28_R)
        with Locations(Location((110.49, 12.7, 0), (0, 0, 90))):
            Circle(SKETCH28_R)
    extrude(amount=BOSS_EXTRUDE8_DEPTH)


solid = part.part
